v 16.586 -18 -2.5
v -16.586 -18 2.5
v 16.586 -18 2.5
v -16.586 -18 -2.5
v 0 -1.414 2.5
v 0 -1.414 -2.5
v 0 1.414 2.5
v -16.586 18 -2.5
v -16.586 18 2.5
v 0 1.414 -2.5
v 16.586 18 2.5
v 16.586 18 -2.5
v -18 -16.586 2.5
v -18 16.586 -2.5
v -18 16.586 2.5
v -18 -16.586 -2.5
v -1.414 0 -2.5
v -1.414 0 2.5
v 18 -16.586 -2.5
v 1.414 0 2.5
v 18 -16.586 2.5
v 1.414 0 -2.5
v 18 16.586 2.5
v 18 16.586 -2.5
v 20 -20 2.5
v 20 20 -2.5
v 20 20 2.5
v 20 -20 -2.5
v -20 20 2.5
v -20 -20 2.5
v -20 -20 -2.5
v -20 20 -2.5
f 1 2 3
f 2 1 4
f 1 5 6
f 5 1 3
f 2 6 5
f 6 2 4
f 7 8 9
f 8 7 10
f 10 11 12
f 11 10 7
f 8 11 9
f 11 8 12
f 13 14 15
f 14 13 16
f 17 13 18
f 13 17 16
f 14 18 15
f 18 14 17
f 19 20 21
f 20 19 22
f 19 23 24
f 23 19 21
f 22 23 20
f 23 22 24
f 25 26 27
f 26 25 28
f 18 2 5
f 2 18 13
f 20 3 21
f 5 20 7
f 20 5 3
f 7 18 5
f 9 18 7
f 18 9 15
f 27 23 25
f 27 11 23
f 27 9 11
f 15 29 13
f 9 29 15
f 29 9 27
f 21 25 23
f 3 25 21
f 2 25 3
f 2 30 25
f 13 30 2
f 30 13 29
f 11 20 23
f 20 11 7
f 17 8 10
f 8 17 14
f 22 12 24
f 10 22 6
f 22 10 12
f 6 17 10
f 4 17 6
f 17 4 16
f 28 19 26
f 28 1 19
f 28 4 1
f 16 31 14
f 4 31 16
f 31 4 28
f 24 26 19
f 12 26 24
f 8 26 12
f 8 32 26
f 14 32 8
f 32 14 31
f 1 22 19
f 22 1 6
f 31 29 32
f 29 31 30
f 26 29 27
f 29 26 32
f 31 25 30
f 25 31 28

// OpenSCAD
// [FL_INDEX: keywords="openscad, 3d_parametric, Parametric_Rectangular_Truss, csg_solid" | COT="Parametric OpenSCAD design from 3DCodeverse"]
// Title: Parametric Rectangular Truss

//Parametric Rectangular Truss
//Created by Jon Hollander, 8/16/13

truss_width=40;
truss_height=40;
truss_thickness=5;
beam_thickness_percentage=10; //[1:100]

module truss(base_w,base_h,link_thickness, p){
	x0 = base_w/2;
	y0 = base_h/2;

	x1 =(1-p/100)*x0;
	y1 =(1-p/100)*y0;

	d=p/100*x0/sqrt(2);

	difference(){
		cube([base_w, base_h, link_thickness], center=true);
		translate([0,0,-link_thickness/2-1]){ 
			linear_extrude(height=link_thickness+2) polygon([[-x1+d,-y1],[x1-d,-y1],[0,-d]]);
			linear_extrude(height=link_thickness+2) polygon([[-x1+d,y1],[x1-d,y1],[0,d]]);
			linear_extrude(height=link_thickness+2) 	polygon([[-x1,-y1+d],[-x1,y1-d],[-d,0]]);
			linear_extrude(height=link_thickness+2) 	polygon([[x1,-y1+d],[x1,y1-d],[d,0]]);
			
		}
	}	
}

//For testing and customizer
truss(base_w=truss_width, base_h=truss_height, link_thickness=truss_thickness, p=beam_thickness_percentage);
